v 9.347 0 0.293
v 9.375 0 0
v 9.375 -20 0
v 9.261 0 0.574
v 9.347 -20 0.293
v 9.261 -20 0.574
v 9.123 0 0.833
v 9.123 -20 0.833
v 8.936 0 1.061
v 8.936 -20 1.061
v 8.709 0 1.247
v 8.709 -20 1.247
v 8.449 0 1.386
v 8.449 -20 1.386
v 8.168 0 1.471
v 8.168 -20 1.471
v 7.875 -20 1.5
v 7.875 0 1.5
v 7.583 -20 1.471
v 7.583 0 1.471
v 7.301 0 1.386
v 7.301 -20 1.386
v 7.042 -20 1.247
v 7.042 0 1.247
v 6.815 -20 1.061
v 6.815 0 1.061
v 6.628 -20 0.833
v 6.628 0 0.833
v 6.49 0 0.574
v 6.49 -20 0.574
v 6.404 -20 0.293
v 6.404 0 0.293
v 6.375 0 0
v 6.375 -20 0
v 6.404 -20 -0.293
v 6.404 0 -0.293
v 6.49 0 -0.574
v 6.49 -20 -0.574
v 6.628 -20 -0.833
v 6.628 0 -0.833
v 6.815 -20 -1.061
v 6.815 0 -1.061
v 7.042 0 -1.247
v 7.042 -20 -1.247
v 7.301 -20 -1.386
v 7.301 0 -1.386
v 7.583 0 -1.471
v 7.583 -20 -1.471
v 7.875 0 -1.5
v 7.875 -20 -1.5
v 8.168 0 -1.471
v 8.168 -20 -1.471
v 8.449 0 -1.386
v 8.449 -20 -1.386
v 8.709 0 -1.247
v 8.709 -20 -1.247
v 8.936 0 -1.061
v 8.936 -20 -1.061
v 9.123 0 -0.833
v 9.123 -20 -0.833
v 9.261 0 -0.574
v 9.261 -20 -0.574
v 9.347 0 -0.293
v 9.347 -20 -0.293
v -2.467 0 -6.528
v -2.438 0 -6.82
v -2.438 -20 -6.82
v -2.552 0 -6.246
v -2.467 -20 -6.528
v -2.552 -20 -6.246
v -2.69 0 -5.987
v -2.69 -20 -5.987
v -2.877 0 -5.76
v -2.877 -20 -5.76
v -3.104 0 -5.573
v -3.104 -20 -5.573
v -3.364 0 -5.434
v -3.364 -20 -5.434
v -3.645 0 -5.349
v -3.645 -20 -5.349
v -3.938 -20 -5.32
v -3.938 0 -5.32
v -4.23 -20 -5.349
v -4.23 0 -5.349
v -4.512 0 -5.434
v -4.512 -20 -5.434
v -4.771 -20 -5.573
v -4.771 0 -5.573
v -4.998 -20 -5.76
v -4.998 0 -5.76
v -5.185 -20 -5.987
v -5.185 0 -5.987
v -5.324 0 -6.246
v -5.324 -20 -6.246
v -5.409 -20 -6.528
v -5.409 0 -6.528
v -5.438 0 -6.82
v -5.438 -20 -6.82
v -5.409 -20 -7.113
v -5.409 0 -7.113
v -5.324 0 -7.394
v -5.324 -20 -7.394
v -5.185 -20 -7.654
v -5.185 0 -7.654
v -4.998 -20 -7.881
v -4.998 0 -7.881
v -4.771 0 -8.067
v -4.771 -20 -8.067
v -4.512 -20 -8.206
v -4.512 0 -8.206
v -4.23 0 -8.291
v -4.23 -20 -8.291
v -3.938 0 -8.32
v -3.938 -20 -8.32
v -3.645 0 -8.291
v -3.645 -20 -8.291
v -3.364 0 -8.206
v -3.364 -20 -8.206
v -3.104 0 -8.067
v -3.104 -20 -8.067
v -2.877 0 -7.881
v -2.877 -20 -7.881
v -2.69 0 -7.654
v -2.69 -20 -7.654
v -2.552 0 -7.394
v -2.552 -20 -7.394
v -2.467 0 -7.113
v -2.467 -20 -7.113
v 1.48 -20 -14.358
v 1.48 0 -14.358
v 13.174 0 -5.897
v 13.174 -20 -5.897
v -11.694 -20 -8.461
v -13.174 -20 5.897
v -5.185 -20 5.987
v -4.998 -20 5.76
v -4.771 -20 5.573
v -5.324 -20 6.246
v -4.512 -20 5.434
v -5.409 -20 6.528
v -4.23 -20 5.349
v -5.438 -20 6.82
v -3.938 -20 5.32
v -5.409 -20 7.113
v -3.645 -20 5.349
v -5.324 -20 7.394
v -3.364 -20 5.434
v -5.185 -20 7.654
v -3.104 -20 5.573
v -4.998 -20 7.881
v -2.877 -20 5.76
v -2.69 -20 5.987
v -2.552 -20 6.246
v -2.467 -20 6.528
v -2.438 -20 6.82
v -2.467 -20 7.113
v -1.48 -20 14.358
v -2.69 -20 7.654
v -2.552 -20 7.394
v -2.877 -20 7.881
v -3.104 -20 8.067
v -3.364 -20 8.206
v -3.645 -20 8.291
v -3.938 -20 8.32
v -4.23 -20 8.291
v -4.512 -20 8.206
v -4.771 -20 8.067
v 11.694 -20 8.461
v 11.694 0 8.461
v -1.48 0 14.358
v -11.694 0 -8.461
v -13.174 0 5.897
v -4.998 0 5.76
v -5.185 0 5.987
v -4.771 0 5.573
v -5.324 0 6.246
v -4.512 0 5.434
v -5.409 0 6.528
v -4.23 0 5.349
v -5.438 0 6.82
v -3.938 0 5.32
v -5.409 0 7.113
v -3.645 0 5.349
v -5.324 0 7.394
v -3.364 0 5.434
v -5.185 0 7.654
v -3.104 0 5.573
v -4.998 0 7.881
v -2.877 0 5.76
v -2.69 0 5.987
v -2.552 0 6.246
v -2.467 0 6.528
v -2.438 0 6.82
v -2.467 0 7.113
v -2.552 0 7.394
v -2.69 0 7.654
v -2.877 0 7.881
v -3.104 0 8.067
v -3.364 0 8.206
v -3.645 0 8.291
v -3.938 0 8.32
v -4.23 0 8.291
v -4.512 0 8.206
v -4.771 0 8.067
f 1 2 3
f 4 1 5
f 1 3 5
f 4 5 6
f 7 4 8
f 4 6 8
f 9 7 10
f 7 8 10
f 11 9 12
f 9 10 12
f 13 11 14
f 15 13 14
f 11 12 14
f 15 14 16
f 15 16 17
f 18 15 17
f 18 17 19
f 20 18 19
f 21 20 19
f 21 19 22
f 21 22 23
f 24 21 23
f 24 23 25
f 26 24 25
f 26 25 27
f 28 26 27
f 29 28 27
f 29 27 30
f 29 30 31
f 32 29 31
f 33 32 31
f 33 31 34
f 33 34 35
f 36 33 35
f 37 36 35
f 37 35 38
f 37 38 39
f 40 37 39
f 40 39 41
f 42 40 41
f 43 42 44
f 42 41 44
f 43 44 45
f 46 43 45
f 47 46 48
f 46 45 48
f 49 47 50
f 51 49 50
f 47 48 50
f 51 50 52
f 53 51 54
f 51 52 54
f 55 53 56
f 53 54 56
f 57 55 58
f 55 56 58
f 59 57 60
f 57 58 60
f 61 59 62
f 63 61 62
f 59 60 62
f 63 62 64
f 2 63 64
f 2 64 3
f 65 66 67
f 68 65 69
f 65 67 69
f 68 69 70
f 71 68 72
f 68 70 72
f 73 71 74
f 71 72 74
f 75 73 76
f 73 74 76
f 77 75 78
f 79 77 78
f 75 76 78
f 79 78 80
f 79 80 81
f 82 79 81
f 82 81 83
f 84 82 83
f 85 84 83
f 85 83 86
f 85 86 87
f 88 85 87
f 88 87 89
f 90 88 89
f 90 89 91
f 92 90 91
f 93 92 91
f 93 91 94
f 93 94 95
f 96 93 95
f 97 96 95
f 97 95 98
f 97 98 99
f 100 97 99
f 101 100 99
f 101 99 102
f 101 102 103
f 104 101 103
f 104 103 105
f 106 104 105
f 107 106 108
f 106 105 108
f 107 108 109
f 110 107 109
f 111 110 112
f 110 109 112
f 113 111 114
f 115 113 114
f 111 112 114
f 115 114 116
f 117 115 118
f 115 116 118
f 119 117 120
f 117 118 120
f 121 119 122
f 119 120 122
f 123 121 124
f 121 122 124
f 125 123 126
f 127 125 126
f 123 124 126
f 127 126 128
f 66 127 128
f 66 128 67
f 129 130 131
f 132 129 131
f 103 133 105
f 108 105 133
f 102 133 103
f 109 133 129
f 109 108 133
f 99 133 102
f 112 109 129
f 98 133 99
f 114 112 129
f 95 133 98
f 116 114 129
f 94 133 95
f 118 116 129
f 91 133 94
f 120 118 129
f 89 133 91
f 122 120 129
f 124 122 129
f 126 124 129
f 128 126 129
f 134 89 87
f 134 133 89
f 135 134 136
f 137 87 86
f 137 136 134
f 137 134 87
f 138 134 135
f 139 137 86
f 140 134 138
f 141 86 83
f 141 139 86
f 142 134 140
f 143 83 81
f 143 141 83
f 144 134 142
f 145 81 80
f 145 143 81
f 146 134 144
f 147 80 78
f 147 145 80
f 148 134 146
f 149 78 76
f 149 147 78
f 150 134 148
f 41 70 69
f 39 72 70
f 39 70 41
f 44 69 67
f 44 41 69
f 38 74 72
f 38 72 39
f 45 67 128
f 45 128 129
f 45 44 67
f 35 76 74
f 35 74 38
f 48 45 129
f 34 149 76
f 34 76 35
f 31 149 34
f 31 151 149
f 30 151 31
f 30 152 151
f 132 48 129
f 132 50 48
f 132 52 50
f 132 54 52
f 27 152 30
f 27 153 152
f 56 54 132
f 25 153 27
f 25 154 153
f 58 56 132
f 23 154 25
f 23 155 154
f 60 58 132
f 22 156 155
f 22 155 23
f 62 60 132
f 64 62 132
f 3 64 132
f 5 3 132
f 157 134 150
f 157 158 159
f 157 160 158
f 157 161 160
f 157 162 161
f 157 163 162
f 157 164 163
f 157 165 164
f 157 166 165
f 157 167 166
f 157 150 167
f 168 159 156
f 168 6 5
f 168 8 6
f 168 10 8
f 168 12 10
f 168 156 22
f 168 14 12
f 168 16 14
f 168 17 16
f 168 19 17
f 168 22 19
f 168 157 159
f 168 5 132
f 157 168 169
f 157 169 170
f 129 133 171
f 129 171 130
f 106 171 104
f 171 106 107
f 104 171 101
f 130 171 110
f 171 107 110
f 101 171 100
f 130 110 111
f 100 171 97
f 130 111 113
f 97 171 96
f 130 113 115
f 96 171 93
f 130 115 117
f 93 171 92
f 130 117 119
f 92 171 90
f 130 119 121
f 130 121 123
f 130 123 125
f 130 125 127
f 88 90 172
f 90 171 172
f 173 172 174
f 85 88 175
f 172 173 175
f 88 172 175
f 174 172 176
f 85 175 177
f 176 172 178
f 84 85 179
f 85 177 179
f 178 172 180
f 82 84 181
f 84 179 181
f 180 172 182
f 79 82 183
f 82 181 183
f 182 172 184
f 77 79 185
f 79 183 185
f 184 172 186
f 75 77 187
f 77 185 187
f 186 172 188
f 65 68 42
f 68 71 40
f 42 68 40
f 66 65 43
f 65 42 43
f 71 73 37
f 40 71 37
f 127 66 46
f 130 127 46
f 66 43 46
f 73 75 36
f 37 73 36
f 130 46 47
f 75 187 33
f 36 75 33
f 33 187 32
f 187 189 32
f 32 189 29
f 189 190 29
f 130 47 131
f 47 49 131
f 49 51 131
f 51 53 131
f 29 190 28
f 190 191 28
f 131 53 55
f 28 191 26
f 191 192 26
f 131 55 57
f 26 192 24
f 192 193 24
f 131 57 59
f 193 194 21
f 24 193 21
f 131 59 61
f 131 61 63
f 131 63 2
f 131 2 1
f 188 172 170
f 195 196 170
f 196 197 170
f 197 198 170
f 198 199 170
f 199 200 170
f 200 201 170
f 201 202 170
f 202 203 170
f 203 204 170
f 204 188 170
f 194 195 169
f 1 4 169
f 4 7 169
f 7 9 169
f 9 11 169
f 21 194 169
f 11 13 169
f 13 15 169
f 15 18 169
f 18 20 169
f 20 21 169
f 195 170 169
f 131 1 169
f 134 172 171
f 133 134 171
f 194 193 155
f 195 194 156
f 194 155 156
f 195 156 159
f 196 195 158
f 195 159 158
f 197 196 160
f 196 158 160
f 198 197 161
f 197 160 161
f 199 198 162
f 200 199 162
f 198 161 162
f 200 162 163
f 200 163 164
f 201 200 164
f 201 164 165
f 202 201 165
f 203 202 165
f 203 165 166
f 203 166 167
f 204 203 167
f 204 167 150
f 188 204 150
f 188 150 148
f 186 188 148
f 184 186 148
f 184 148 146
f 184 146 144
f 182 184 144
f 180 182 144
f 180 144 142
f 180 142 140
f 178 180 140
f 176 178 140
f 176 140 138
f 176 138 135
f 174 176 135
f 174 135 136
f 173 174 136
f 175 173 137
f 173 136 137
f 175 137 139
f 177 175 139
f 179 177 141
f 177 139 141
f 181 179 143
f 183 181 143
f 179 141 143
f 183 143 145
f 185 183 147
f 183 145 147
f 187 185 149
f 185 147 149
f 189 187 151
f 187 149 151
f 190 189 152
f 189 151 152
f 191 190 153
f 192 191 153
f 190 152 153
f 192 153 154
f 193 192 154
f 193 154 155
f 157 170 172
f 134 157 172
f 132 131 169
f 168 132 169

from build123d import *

# Parameters (mm, degrees)
F1_DEPTH = 20
F3_D     = 3


with BuildPart() as f1:
    # F0 (on Front) → F1 (new body)
    with BuildSketch(Plane.XZ):
        Polygon((1.48048, -14.357629), (13.174312, -5.896681), (11.693831, 8.460948), (-1.48048, 14.357629), (-13.174312, 5.896681), (-11.693831, -8.460948), align=None)
    extrude(amount=F1_DEPTH)

    # F3 (through all)
    with Locations(Plane(origin=(0, 0, 0), x_dir=(-1, 0, 0), z_dir=(0, 1, 0))):
        with Locations((3.93769, -6.820278), (3.93769, 6.820278), (-7.875379, 0)):
            Hole(F3_D / 2)


solid = f1.part
